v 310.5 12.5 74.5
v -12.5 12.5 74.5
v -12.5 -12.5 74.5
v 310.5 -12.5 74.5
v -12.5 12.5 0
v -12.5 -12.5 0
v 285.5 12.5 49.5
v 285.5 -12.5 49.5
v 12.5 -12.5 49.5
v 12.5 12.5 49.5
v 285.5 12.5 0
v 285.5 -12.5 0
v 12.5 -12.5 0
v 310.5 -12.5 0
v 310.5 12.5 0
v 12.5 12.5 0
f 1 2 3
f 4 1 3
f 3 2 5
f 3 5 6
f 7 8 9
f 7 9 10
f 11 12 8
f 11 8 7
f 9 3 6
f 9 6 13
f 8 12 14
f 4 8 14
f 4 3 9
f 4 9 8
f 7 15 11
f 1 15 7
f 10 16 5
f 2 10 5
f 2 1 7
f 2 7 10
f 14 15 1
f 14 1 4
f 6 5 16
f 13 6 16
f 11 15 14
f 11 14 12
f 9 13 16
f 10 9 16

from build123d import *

# Parameters (mm, degrees)
SKETCH1_W = 25
SKETCH1_H = 25


with BuildPart() as part:
    # Sweep1: sweep along a path in Sketch2
    with BuildLine(Plane(origin=(0, 0, 0), x_dir=(1, 0, 0), z_dir=(0, 1, 0))) as sweep1_path:
        Line((0, 0), (0, -62))
        Line((0, -62), (298, -62))
        Line((298, -62), (298, 0))
    # Sketch1 → Sweep1 (sweep)
    with BuildSketch(Plane.XY):
        Rectangle(SKETCH1_W, SKETCH1_H)
    sweep(path=sweep1_path.line, transition=Transition.RIGHT)


solid = part.part
